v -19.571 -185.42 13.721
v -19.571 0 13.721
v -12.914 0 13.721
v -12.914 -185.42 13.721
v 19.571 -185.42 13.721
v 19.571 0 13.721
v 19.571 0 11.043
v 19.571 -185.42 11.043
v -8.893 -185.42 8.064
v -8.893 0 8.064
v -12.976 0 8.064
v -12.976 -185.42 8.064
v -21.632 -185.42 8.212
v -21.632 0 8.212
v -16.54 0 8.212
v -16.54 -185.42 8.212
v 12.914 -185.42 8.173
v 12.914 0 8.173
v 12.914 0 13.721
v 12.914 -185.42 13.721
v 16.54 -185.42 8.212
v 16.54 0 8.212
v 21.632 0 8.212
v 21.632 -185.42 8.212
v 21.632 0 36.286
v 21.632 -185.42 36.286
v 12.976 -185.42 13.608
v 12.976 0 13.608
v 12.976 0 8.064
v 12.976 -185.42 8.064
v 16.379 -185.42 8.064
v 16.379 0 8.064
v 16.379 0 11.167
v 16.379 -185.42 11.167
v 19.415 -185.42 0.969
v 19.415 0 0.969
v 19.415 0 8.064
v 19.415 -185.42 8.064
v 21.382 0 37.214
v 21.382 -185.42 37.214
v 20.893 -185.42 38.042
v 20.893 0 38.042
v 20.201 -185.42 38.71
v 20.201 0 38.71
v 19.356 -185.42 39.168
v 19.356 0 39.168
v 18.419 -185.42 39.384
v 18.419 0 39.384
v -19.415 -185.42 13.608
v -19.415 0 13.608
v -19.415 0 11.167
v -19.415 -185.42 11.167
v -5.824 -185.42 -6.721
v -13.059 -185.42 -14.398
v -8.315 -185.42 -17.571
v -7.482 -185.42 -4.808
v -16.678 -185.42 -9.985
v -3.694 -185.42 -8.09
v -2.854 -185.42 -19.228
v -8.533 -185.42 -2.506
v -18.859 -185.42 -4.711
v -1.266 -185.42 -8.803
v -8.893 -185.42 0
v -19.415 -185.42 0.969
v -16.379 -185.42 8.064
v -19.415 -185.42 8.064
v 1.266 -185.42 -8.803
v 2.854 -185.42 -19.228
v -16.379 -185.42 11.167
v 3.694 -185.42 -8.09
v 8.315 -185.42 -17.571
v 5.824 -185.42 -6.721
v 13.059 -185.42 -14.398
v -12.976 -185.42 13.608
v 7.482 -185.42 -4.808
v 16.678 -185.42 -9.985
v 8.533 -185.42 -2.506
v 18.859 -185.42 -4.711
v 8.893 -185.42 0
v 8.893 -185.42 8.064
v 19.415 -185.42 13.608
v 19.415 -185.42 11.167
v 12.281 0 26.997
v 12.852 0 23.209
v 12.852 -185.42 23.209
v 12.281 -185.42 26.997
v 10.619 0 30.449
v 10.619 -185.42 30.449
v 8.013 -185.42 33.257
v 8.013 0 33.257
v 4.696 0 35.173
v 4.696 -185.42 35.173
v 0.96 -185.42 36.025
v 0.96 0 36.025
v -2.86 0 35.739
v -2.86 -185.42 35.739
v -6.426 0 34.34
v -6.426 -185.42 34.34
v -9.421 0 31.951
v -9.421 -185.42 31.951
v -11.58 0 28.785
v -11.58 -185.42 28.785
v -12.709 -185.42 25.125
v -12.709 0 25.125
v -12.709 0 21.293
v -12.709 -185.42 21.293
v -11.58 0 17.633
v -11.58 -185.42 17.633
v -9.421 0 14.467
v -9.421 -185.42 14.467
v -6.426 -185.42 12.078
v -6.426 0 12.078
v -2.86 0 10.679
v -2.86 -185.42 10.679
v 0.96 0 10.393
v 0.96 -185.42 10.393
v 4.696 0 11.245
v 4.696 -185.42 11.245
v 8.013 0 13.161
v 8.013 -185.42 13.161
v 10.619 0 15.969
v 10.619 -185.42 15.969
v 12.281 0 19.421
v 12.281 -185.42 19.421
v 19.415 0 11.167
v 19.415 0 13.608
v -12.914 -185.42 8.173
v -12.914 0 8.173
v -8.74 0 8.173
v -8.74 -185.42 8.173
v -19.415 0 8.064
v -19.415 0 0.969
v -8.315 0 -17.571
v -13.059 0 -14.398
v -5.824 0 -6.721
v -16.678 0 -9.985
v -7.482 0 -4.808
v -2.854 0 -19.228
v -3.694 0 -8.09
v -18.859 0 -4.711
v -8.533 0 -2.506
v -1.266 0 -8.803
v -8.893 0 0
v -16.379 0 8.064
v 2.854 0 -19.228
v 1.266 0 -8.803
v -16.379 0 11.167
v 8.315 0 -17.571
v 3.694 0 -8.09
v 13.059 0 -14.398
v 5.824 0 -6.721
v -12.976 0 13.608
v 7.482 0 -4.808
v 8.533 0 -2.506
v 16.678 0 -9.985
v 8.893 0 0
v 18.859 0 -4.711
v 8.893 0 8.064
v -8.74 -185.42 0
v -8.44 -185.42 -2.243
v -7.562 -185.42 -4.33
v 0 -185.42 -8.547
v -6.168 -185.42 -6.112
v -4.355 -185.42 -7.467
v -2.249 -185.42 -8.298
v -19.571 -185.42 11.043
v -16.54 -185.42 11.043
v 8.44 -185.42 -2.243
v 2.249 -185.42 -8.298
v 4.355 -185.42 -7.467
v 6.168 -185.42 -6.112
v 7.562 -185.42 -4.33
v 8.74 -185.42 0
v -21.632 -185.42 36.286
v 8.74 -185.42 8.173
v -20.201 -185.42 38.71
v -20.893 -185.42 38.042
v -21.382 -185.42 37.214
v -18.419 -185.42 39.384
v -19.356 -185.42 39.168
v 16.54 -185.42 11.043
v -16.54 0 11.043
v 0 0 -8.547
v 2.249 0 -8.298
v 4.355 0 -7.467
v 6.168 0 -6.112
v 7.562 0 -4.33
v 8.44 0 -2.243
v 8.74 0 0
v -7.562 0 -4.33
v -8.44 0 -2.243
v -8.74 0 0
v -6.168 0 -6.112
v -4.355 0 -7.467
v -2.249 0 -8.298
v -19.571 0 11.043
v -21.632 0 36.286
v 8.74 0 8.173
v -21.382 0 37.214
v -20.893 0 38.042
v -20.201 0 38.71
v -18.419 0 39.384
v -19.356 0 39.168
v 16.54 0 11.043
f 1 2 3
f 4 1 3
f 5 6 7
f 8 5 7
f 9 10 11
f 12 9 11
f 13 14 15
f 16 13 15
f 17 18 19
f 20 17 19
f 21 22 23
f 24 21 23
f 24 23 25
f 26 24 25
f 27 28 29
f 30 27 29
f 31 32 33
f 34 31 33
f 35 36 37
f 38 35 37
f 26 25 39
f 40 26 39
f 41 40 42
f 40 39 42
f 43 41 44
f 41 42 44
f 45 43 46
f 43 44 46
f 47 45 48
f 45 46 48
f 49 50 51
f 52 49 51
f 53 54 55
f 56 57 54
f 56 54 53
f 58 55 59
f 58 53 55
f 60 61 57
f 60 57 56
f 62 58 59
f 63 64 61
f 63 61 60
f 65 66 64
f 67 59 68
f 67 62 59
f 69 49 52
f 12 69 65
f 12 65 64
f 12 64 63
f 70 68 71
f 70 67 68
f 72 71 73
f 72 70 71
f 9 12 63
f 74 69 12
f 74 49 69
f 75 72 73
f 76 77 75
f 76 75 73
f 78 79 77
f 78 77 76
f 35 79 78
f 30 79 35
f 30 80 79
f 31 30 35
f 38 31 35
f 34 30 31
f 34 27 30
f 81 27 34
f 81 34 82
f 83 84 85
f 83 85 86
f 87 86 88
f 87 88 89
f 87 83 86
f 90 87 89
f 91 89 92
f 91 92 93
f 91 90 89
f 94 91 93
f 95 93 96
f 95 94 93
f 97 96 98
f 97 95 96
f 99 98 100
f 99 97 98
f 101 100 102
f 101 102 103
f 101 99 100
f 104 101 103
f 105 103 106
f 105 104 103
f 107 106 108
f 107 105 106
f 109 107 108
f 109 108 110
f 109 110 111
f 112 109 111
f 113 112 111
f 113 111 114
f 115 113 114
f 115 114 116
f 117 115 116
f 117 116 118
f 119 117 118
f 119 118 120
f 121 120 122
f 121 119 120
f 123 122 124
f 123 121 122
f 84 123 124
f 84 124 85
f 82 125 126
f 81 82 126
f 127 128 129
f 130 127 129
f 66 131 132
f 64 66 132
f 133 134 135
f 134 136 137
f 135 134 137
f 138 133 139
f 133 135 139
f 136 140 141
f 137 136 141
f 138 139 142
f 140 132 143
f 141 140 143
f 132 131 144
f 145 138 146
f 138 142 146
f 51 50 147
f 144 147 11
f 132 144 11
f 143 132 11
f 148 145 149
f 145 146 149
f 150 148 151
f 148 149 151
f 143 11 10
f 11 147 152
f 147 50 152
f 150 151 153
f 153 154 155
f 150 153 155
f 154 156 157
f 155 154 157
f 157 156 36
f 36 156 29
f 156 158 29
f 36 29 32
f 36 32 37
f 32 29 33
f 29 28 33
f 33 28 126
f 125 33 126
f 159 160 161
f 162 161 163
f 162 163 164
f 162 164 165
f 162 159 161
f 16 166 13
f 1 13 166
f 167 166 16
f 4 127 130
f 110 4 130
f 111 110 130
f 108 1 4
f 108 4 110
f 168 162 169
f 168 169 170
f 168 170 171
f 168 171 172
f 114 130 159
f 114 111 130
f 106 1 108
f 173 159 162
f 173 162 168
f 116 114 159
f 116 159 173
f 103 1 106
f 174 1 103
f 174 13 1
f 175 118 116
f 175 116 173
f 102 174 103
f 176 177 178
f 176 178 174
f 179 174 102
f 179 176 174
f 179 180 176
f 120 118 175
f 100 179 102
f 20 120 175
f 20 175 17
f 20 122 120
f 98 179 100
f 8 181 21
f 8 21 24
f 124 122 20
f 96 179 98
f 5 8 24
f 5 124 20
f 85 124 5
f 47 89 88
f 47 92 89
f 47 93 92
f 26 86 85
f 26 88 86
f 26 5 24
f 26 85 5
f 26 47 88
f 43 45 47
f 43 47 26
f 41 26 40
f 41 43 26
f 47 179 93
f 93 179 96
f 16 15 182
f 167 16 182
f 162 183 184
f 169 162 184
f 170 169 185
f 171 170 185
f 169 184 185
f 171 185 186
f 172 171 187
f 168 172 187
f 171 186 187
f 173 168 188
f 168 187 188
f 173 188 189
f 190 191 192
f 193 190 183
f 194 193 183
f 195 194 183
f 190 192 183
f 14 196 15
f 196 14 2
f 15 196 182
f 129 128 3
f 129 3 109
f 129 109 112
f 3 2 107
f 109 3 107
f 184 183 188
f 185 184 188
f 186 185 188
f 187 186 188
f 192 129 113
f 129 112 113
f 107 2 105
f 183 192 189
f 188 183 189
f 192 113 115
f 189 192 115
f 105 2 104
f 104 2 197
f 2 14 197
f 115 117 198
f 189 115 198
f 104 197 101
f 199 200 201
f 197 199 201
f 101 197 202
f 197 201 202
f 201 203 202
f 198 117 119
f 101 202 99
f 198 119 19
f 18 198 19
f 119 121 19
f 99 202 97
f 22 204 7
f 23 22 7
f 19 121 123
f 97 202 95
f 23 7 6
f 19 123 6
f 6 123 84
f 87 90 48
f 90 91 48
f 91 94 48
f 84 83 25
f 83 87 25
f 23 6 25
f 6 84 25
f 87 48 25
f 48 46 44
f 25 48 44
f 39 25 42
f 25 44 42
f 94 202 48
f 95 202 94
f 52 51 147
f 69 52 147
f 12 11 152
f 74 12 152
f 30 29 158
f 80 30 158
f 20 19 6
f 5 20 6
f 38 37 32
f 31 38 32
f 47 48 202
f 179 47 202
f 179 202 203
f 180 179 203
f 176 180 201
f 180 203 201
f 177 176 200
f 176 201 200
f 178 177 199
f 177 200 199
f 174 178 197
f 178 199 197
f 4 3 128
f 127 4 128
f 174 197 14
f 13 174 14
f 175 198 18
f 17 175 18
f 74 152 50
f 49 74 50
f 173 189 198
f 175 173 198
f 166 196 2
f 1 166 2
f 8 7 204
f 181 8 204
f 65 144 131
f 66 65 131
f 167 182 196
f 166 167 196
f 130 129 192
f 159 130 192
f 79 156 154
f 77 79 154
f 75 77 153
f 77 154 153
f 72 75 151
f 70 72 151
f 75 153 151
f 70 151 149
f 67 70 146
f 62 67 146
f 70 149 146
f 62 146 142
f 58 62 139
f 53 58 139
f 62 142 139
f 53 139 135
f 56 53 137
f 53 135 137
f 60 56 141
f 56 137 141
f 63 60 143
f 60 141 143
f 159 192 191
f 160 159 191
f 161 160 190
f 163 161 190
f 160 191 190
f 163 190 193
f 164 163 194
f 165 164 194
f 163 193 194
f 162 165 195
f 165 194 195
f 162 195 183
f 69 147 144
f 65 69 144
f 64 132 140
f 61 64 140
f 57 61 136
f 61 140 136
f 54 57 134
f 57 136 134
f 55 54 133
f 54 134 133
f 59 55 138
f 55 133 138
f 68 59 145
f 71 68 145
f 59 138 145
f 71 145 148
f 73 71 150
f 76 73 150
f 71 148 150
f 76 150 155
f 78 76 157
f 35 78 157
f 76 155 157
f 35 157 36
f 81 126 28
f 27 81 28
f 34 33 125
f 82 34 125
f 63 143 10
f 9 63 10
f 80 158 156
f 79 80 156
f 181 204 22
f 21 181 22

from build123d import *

# Parameters (mm, degrees)
F0_R     = 12.852413
F1_DEPTH = 185.42


with BuildPart() as f1:
    # F0 (on Front) → F1 (new body)
    with BuildSketch(Plane.XZ):
        with BuildLine():
            ThreePointArc((8.89335, 0), (0, -8.89335), (-8.89335, 0))
            Line((-8.89335, 0), (-8.89335, 8.063619))
            Line((-8.89335, 8.063619), (-12.97598, 8.063619))
            Line((-12.97598, 8.063619), (-12.97598, 13.607984))
            Line((-12.97598, 13.607984), (-19.414598, 13.607984))
            Line((-19.414598, 13.607984), (-19.414598, 11.167311))
            Line((-19.414598, 11.167311), (-16.379405, 11.167311))
            Line((-16.379405, 11.167311), (-16.379405, 8.063619))
            Line((-16.379405, 8.063619), (-19.414598, 8.063619))
            Line((-19.414598, 8.063619), (-19.414598, 0.969209))
            ThreePointArc((-19.414598, 0.969209), (0, -19.438775), (19.414598, 0.969209))
            Line((19.414598, 0.969209), (19.414598, 8.063619))
            Line((19.414598, 8.063619), (16.379405, 8.063619))
            Line((16.379405, 8.063619), (16.379405, 11.167311))
            Line((16.379405, 11.167311), (19.414598, 11.167311))
            Line((19.414598, 11.167311), (19.414598, 13.607984))
            Line((19.414598, 13.607984), (12.97598, 13.607984))
            Line((12.97598, 13.607984), (12.97598, 8.063619))
            Line((12.97598, 8.063619), (8.89335, 8.063619))
            Line((8.89335, 8.063619), (8.89335, 0))
        make_face()
        with BuildLine():
            Line((-16.540358, 11.043042), (-19.571194, 11.043042))
            Line((-19.571194, 11.043042), (-19.571194, 13.720666))
            Line((-19.571194, 13.720666), (-12.914112, 13.720666))
            Line((-12.914112, 13.720666), (-12.914112, 8.173157))
            Line((-12.914112, 8.173157), (-8.739699, 8.173157))
            Line((-8.739699, 8.173157), (-8.739699, 0))
            ThreePointArc((-8.739699, 0), (-6.167987, -6.112296), (0, -8.547417))
            ThreePointArc((0, -8.547417), (6.167987, -6.112296), (8.739699, 0))
            Line((8.739699, 0), (8.739699, 8.173157))
            Line((8.739699, 8.173157), (12.914112, 8.173157))
            Line((12.914112, 8.173157), (12.914112, 13.720666))
            Line((12.914112, 13.720666), (19.571194, 13.720666))
            Line((19.571194, 13.720666), (19.571194, 11.043042))
            Line((19.571194, 11.043042), (16.540358, 11.043042))
            Line((16.540358, 11.043042), (16.540358, 8.211602))
            Line((16.540358, 8.211602), (21.63163, 8.211602))
            Line((21.63163, 8.211602), (21.63163, 36.286056))
            ThreePointArc((21.63163, 36.286056), (20.569301, 38.399275), (18.419044, 39.384481))
            Line((18.419044, 39.384481), (0, 39.384481))
            Line((0, 39.384481), (-18.419044, 39.384481))
            ThreePointArc((-18.419044, 39.384481), (-20.569301, 38.399275), (-21.63163, 36.286056))
            Line((-21.63163, 36.286056), (-21.63163, 8.211602))
            Line((-21.63163, 8.211602), (-16.540358, 8.211602))
            Line((-16.540358, 8.211602), (-16.540358, 11.043042))
        make_face()
        with Locations((0, 23.209002)):
            Circle(F0_R, mode=Mode.SUBTRACT)
    extrude(amount=F1_DEPTH)


solid = f1.part
